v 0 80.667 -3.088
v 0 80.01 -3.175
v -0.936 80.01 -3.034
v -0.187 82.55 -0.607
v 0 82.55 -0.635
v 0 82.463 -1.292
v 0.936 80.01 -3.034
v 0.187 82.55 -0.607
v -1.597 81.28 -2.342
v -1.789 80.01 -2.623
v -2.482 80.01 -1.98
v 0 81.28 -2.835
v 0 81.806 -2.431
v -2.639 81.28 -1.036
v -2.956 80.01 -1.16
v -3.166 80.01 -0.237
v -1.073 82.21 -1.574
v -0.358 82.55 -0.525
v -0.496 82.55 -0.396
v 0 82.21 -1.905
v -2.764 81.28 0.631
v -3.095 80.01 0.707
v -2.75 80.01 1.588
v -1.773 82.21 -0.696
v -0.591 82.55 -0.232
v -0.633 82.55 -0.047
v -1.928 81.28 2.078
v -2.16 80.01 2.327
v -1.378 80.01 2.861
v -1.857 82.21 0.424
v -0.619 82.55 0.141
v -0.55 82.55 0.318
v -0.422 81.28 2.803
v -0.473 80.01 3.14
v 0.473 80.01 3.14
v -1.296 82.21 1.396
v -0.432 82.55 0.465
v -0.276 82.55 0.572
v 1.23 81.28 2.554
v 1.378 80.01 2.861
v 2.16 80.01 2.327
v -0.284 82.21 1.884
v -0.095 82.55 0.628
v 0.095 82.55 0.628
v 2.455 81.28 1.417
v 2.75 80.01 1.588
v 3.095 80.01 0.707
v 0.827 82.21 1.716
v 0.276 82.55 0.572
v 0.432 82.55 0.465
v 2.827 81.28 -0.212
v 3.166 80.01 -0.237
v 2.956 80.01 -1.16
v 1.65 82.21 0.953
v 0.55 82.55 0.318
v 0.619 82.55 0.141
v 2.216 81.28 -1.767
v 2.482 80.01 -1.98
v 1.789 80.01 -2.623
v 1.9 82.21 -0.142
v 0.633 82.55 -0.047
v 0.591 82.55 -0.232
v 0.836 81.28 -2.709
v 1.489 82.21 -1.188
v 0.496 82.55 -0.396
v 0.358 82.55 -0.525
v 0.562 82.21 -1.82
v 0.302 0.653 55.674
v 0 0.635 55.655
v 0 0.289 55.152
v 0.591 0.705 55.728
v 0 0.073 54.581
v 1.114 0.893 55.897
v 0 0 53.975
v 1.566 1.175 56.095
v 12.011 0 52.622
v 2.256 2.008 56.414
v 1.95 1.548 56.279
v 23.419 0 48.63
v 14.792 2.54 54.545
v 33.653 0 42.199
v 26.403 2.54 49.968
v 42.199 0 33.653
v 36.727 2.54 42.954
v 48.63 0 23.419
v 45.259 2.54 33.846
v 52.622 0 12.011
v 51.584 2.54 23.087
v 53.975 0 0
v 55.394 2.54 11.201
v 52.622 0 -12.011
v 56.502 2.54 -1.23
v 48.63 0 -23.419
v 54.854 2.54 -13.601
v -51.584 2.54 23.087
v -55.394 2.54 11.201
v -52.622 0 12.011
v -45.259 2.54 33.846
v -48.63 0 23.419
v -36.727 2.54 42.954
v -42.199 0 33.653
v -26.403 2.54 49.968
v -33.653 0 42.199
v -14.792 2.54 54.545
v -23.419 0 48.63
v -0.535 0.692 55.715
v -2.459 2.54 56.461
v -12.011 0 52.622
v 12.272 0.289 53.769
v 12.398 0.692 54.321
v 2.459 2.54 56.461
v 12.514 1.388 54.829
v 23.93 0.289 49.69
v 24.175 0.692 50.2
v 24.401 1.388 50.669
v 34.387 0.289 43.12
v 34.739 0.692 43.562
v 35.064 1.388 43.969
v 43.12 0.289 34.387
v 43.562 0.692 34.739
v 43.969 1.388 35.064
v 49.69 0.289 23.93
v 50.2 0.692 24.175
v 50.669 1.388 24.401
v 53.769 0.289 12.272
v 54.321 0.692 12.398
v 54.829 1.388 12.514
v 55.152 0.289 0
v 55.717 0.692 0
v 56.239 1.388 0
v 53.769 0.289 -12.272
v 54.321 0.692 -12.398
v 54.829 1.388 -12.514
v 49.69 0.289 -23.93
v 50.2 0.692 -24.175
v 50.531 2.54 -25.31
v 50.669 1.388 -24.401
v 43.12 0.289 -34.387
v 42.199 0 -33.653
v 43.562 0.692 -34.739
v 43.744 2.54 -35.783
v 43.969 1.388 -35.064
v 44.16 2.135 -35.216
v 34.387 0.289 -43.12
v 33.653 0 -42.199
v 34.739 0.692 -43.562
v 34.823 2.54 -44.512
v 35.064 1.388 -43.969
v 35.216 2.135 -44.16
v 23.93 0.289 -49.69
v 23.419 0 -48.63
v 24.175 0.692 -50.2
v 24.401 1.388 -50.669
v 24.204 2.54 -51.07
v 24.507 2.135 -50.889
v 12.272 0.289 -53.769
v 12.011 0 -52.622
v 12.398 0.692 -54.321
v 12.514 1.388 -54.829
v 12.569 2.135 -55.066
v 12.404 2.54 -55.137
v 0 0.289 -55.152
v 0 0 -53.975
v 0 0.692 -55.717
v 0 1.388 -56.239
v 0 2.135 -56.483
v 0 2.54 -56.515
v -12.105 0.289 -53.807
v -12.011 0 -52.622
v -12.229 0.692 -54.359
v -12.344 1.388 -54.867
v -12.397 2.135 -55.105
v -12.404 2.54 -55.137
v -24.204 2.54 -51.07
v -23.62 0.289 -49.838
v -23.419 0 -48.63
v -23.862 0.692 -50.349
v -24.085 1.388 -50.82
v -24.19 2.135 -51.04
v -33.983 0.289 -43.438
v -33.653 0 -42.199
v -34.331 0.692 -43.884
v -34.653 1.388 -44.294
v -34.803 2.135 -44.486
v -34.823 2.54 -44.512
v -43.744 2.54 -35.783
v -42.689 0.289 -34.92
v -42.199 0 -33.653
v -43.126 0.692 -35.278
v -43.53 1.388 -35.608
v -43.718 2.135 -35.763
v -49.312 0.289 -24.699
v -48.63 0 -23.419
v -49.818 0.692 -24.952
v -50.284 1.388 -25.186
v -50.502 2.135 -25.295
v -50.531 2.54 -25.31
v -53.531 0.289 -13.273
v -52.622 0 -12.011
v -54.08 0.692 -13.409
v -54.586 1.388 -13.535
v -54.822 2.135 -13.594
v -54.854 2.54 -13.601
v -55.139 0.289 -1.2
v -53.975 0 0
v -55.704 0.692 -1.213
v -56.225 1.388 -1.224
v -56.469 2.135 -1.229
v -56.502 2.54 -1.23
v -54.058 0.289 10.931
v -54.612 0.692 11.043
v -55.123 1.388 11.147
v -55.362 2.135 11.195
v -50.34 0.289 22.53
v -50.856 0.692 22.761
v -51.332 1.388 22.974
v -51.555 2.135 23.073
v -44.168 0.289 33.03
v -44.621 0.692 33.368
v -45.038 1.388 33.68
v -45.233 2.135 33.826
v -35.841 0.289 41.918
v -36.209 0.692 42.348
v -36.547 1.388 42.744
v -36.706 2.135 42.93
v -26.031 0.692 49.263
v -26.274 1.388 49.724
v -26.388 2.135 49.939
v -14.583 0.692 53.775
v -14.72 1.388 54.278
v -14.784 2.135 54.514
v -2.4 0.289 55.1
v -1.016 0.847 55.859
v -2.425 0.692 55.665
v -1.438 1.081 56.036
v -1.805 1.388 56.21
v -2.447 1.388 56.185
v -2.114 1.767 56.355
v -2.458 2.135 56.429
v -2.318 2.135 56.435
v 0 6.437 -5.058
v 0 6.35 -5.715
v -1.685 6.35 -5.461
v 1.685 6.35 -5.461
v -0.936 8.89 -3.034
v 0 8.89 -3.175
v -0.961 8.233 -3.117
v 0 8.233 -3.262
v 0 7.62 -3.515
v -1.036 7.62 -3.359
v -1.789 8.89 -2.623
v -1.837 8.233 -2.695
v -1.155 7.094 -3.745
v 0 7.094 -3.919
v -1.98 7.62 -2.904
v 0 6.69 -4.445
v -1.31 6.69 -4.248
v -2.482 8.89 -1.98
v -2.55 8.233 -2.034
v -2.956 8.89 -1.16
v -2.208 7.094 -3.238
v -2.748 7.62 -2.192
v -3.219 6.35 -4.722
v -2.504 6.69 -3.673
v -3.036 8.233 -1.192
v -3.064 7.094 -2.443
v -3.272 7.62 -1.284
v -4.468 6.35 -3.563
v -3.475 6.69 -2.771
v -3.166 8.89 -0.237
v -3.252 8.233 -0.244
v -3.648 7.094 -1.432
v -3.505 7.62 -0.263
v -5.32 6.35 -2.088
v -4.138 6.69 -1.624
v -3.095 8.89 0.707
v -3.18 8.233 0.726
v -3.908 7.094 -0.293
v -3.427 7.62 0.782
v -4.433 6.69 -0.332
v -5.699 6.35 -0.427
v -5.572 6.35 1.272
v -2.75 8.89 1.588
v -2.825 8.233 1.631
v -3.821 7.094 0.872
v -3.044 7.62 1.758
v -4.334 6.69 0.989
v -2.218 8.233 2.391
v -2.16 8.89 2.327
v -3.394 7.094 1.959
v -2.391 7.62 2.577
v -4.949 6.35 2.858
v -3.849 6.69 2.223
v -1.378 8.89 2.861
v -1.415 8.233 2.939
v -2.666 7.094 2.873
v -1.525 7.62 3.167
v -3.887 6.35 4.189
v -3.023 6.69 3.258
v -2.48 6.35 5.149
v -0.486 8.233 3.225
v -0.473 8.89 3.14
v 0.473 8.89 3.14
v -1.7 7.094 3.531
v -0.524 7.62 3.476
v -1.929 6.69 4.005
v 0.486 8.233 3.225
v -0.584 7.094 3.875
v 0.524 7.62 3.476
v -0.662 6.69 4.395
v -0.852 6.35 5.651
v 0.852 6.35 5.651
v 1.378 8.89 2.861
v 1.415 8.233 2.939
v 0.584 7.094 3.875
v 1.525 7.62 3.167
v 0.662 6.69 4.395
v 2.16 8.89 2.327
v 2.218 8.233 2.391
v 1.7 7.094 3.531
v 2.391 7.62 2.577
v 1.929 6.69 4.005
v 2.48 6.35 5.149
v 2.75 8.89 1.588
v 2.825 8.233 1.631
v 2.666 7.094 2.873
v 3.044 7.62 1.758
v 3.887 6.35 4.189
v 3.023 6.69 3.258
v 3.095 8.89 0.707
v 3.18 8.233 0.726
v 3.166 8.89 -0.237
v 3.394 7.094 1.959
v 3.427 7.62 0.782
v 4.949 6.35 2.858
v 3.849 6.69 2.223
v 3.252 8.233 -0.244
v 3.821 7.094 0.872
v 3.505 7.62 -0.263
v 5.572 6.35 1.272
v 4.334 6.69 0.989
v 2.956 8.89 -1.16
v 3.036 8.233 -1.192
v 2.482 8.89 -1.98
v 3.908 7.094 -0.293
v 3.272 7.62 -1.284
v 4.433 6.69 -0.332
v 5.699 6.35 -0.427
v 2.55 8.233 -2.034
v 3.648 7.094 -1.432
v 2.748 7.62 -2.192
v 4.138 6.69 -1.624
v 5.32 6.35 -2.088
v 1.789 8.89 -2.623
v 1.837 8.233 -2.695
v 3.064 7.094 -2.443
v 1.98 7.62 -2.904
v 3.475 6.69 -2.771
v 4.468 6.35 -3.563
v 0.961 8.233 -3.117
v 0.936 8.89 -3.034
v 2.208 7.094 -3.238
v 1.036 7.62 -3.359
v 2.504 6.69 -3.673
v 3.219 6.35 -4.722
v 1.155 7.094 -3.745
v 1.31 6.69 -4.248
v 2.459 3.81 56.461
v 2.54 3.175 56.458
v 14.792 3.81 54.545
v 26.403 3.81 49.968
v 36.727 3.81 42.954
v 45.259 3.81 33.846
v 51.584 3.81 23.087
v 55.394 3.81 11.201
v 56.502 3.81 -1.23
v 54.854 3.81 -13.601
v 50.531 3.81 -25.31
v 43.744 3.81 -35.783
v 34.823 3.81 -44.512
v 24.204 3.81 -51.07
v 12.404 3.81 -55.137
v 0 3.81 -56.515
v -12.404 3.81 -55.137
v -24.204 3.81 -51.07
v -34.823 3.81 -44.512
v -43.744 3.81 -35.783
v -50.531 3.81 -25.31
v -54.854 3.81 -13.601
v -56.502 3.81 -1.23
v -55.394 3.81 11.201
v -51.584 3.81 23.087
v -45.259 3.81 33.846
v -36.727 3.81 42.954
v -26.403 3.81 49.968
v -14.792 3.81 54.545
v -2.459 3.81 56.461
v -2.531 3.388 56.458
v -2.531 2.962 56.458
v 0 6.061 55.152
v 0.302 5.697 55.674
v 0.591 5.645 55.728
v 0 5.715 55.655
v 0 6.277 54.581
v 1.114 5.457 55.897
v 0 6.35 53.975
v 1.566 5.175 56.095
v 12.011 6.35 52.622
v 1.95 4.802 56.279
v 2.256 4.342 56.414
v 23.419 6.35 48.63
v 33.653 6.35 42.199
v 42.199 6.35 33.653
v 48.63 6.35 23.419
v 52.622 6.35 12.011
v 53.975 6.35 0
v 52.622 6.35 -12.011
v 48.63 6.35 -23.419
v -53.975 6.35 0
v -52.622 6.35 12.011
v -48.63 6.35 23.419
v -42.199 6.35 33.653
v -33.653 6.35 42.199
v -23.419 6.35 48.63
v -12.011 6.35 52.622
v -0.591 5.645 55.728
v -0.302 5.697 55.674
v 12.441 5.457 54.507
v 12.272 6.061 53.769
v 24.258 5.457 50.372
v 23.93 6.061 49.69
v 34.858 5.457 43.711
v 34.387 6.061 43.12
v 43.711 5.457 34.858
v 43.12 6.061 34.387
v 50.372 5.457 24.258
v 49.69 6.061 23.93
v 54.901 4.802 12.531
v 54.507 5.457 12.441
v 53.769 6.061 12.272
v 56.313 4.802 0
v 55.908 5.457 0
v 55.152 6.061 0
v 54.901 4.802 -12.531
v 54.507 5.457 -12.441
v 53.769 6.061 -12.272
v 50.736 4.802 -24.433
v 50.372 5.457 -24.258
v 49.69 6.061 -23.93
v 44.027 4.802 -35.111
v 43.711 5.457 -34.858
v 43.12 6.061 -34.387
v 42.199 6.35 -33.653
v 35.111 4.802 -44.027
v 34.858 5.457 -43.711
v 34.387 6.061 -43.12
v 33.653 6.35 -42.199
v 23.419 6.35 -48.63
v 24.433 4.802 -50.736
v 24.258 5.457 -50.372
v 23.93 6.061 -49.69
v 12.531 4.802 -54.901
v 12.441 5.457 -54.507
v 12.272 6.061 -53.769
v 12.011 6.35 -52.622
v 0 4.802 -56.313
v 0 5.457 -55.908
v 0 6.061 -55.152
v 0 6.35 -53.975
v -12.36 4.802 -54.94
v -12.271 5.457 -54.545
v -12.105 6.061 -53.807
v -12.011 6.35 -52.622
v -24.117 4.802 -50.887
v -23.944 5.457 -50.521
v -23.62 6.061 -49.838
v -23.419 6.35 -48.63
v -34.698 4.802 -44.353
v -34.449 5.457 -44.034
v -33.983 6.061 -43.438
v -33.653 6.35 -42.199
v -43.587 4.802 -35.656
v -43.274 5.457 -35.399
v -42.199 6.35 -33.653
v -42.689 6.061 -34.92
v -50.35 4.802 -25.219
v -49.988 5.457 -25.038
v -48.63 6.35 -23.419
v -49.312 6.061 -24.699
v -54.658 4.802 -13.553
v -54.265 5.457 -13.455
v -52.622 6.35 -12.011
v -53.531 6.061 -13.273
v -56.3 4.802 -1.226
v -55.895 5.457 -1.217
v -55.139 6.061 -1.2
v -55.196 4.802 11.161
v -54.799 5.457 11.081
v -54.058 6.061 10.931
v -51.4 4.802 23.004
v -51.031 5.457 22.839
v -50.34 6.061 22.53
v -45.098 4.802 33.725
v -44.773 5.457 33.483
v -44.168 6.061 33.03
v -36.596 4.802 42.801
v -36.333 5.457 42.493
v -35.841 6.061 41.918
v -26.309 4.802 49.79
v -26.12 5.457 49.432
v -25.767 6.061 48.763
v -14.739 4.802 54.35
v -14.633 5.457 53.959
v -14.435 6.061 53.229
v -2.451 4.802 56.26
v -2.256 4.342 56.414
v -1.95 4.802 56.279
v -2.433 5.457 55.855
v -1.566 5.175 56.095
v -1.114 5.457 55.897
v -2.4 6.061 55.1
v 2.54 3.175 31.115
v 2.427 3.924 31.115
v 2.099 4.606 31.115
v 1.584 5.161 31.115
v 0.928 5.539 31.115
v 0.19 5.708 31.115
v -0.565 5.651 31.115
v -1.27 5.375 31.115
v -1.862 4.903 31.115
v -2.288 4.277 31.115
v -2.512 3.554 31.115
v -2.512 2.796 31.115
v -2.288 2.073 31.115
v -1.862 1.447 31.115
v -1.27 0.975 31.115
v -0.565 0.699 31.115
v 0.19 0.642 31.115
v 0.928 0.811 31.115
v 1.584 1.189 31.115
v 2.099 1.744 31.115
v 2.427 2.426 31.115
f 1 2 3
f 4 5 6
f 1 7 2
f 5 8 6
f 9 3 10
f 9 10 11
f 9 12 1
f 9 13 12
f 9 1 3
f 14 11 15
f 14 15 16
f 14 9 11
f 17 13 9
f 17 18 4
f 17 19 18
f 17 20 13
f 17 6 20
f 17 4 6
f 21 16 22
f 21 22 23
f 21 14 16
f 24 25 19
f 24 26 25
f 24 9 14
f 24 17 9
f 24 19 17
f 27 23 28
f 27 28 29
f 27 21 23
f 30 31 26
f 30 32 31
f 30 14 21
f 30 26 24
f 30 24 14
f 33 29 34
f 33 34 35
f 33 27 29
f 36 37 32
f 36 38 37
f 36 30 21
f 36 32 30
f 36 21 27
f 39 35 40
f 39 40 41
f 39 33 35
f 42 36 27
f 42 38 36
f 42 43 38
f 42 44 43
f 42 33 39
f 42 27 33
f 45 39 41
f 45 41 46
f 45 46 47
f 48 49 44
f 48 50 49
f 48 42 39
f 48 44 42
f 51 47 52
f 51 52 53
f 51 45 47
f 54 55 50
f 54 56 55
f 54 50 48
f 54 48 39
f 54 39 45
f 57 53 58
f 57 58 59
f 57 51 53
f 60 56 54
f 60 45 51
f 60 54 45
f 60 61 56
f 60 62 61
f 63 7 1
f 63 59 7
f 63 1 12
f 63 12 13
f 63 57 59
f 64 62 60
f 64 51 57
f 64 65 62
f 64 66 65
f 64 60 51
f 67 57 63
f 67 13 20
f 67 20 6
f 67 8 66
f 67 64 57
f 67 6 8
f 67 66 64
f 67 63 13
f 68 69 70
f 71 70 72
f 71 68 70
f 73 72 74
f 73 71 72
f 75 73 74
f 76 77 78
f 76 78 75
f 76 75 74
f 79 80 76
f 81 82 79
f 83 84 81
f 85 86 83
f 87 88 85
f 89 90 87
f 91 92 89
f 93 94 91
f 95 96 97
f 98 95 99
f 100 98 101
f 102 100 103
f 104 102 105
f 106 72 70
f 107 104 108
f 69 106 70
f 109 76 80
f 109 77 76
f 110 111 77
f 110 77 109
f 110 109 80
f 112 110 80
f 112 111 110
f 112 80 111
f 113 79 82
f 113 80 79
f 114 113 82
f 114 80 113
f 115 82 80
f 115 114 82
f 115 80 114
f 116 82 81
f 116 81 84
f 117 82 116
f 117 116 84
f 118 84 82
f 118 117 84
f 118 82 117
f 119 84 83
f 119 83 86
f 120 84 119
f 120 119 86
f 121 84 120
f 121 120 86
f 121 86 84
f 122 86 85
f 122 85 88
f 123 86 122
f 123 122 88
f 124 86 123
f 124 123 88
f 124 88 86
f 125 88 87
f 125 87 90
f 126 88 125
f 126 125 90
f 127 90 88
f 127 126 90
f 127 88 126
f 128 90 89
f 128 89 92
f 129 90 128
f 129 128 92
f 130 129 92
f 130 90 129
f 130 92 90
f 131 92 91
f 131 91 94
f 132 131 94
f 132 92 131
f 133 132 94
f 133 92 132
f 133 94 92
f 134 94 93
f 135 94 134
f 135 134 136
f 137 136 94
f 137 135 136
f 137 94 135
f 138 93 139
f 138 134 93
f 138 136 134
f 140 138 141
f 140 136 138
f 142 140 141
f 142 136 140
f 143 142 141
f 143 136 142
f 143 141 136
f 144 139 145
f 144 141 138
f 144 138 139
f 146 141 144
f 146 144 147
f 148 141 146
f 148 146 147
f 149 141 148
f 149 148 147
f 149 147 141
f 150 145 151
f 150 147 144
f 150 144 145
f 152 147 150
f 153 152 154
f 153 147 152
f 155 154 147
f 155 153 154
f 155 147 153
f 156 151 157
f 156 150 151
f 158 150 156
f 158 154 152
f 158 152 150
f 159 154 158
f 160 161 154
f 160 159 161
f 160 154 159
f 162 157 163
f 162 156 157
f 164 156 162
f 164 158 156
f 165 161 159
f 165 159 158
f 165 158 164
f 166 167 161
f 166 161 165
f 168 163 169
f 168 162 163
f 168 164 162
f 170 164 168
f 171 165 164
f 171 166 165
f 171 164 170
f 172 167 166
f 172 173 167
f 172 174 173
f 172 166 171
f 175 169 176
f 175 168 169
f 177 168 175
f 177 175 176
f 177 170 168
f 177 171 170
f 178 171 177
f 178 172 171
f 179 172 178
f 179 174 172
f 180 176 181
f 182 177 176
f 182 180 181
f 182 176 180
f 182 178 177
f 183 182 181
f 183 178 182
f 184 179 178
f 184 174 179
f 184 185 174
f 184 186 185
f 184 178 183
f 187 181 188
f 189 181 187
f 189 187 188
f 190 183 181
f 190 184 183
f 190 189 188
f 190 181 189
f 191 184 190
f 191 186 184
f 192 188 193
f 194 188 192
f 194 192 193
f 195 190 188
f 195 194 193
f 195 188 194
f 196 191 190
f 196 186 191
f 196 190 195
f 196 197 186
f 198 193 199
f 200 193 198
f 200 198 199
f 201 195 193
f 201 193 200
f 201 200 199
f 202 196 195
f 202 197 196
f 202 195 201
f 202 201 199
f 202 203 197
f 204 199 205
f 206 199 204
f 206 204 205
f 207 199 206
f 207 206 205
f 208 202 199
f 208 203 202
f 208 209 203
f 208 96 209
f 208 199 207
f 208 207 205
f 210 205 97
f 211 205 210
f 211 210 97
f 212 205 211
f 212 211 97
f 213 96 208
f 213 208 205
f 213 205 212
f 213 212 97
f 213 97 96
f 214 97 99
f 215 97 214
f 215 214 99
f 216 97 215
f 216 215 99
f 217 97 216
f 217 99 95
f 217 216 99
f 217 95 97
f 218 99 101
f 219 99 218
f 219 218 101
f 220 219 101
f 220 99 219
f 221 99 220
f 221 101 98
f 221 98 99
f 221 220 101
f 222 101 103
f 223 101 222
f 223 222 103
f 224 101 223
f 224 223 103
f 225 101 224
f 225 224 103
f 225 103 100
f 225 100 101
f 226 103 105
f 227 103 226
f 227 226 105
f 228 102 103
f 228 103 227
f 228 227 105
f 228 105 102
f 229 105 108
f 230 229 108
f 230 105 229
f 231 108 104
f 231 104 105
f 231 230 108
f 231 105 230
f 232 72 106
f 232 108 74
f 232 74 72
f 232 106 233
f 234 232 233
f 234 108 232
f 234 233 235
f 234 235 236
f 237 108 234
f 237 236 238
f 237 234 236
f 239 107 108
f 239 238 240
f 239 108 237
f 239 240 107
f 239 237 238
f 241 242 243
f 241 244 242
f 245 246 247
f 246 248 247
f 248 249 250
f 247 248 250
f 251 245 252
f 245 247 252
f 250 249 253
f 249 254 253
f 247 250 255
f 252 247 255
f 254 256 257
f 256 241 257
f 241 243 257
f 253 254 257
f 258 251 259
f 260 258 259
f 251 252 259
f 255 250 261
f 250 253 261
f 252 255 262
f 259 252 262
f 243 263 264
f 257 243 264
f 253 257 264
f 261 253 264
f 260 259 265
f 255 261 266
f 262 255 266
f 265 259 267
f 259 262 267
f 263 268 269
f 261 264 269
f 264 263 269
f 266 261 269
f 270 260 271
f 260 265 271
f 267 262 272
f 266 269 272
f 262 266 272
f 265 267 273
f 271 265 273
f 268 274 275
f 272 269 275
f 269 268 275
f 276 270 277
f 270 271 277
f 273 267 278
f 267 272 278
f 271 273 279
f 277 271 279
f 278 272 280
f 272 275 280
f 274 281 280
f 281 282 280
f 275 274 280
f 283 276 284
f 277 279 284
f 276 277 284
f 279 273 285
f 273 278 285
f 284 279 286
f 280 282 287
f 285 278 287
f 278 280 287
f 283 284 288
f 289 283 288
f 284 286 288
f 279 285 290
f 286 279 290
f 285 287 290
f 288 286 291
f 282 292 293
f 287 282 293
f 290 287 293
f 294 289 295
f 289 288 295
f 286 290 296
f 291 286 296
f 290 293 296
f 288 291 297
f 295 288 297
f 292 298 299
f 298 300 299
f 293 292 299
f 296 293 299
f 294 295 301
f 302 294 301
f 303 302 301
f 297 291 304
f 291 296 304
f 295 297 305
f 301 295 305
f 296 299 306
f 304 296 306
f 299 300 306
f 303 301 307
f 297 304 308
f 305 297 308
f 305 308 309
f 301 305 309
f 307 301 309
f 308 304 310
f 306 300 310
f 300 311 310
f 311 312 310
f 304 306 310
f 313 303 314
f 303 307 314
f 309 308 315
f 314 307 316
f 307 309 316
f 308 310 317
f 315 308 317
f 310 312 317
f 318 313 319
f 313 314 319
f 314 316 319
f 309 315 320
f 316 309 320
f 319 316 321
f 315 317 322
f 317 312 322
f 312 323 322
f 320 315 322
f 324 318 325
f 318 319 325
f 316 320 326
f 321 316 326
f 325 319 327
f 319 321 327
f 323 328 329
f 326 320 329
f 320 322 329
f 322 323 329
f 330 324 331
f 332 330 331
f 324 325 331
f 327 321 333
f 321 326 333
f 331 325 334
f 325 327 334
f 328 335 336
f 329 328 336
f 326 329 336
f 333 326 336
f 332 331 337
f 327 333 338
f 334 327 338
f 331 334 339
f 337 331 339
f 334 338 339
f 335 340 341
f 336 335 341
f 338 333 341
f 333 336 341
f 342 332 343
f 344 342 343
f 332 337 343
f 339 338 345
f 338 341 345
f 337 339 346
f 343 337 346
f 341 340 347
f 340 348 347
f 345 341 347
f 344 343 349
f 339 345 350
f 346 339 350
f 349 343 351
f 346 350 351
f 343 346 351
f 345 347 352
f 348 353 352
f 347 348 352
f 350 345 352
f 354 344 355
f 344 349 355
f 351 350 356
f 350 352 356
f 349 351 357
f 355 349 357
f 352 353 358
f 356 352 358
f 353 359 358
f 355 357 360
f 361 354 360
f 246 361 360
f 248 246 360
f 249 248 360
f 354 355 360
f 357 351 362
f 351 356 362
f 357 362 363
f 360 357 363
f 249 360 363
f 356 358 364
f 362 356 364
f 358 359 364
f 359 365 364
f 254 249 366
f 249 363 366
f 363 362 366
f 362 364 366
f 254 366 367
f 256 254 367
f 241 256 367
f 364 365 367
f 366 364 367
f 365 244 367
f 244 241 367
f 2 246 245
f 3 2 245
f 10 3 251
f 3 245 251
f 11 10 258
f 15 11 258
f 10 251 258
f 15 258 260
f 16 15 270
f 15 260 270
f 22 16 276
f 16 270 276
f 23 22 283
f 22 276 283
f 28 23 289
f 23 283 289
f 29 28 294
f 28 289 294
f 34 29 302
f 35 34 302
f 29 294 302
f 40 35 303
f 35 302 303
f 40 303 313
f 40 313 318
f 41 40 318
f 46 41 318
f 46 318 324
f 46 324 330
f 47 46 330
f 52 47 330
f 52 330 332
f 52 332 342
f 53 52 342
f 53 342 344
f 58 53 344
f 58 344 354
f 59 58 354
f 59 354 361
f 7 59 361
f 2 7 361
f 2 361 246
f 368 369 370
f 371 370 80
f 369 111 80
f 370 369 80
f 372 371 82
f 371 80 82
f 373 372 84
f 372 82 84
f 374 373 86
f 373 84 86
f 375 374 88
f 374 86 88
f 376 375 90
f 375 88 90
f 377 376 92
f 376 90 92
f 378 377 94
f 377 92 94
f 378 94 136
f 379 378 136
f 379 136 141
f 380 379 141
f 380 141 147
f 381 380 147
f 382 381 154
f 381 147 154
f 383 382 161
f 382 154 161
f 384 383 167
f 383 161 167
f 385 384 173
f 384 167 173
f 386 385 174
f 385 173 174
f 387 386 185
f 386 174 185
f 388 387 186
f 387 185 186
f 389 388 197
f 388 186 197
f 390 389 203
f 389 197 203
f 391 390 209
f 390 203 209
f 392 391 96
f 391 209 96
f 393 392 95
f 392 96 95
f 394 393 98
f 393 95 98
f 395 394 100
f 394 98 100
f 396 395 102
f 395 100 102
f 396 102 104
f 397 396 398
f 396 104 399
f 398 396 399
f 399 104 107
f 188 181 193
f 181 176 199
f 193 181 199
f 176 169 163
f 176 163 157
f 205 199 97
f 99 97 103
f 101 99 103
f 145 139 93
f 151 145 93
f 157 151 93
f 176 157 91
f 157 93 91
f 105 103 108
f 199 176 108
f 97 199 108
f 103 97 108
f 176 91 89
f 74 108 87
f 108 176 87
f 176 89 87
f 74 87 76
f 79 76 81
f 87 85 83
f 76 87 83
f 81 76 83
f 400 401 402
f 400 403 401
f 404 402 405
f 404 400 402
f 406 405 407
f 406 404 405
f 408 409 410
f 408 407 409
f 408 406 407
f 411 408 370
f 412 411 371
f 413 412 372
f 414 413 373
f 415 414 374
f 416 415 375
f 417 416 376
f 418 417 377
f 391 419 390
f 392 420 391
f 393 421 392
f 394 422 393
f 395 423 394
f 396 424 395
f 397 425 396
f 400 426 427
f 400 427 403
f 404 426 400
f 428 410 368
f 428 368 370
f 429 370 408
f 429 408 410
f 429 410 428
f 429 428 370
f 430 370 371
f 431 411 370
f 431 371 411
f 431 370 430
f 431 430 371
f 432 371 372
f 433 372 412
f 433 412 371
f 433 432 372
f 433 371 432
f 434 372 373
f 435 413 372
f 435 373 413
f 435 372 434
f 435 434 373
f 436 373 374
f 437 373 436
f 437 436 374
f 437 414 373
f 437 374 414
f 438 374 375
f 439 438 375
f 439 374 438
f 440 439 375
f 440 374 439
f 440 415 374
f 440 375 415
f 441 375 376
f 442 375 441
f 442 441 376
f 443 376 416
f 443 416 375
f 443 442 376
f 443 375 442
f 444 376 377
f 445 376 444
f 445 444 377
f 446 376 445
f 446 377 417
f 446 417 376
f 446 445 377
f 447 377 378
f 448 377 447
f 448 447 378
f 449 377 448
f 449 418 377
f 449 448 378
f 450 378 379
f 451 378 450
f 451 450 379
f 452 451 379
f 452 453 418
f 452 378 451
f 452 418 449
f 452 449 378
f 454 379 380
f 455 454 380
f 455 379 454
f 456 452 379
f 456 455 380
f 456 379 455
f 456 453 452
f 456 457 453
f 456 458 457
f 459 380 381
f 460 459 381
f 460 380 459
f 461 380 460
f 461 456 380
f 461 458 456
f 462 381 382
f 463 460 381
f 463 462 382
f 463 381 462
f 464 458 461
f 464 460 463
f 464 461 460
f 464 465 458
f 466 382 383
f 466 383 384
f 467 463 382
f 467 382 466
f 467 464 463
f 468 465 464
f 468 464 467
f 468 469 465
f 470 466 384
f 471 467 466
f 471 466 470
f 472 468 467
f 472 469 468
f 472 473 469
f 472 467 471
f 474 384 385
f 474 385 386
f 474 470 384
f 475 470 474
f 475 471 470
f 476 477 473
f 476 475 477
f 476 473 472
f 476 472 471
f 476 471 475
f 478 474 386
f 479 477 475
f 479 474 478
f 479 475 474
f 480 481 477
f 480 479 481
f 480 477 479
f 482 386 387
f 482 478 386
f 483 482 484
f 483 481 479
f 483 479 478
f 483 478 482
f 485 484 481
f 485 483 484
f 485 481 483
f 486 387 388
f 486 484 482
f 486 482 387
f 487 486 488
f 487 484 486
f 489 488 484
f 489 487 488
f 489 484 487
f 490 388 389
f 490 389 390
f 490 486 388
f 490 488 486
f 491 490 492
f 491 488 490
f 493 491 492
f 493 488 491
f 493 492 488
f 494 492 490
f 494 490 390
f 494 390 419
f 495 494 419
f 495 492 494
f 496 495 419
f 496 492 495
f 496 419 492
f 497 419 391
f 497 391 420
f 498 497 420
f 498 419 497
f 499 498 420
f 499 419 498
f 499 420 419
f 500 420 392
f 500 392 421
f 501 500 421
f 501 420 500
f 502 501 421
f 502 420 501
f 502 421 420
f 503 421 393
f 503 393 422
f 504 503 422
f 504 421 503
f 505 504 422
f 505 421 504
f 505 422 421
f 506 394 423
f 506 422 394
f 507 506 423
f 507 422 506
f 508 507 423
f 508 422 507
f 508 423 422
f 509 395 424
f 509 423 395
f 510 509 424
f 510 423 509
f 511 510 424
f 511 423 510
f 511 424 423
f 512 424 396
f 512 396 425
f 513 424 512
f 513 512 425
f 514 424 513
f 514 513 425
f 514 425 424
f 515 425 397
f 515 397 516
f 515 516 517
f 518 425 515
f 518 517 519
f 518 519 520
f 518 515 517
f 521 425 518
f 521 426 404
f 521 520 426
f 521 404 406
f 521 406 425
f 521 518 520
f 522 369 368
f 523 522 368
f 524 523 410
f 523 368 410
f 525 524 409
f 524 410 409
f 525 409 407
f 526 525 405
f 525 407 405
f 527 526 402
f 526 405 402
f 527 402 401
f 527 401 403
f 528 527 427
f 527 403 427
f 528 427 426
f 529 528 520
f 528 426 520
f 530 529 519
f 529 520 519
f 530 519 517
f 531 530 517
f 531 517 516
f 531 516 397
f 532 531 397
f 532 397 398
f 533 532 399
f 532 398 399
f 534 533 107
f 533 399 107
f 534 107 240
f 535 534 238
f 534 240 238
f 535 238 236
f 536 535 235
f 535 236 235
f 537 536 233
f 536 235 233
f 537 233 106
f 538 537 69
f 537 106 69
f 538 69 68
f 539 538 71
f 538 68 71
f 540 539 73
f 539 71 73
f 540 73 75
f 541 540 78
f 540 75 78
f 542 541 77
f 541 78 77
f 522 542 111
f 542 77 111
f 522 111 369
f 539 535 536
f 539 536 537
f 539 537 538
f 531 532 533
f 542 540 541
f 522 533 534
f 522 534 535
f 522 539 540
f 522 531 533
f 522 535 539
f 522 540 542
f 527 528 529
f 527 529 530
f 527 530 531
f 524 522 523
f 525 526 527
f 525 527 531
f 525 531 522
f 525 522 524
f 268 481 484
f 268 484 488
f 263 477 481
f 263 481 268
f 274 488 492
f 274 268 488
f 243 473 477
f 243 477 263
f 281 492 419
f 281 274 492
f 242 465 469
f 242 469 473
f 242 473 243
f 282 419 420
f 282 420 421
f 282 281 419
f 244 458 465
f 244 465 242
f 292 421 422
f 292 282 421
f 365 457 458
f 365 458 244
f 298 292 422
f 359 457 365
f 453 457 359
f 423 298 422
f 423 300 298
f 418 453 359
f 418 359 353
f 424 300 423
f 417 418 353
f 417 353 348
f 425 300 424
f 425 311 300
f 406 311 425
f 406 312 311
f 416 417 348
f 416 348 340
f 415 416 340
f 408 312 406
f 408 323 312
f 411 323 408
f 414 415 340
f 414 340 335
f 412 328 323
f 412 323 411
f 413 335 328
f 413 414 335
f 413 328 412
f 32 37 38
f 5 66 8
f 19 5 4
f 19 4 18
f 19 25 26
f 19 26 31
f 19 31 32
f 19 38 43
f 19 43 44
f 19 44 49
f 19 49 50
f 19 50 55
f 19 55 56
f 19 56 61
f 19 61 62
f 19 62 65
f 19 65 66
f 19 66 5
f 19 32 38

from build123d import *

# Parameters (mm, degrees)
SKETCH1_R           = 56.515
BOSS_EXTRUDE1_DEPTH = 6.35
SKETCH2_R           = 3.175
BOSS_EXTRUDE2_DEPTH = 76.2
SKETCH5_R           = 2.54
CUT_EXTRUDE1_DEPTH  = 25.4
FILLET2_R           = 2.54


with BuildPart() as part:
    # Sketch1 → Boss-Extrude1 (new body)
    with BuildSketch(Plane(origin=(0, 0, 0), x_dir=(1, 0, 0), z_dir=(0, 1, 0))):
        with Locations(Location((0, 0, 0), (0, 0, 270))):
            Circle(SKETCH1_R)
    extrude(amount=BOSS_EXTRUDE1_DEPTH)

    # Sketch2 → Boss-Extrude2 (add)
    with BuildSketch(Plane(origin=(0, 6.35, 0), x_dir=(1, 0, 0), z_dir=(0, 1, 0))):
        with Locations(Location((0, 0, 0), (0, 0, 90))):
            Circle(SKETCH2_R)
    extrude(amount=BOSS_EXTRUDE2_DEPTH)

    # Sketch5 → Cut-Extrude1 (cut)
    with BuildSketch(Plane.XY.offset(56.515)):
        with Locations((0, 3.175)):
            Circle(SKETCH5_R)
    extrude(amount=-CUT_EXTRUDE1_DEPTH, mode=Mode.SUBTRACT)

    # Fillet2
    # the kernel refuses this fillet: 2.54 mm, written as the material it adds along each edge
    with BuildSketch(Plane(origin=(0, 6.35, 0), x_dir=(0, 0, -1), z_dir=(1, 0, 0))) as fillet2_piece_1:
        with BuildLine():
            CenterArc((3.175 + FILLET2_R, FILLET2_R), FILLET2_R, 180, 90)
            Line((3.175, FILLET2_R), (3.175, 0))
            Line((3.175, 0), (3.175 + FILLET2_R, 0))
        make_face()
    revolve(axis=Axis((0, 6.35, 0), (0, 1, 0)))
    # the kernel refuses this fillet: 2.54 mm, written as the material it takes off along each edge
    with BuildSketch(Plane(origin=(0, 82.55, 0), x_dir=(0, 0, -1), z_dir=(1, 0, 0))) as fillet2_2_piece_1:
        with BuildLine():
            CenterArc((3.175 - FILLET2_R, -FILLET2_R), FILLET2_R, 0, 90)
            Line((3.175 - FILLET2_R, 0), (3.175, 0))
            Line((3.175, 0), (3.175, -FILLET2_R))
        make_face()
    revolve(axis=Axis((0, 82.55, 0), (0, 1, 0)), mode=Mode.SUBTRACT)
    with BuildSketch(Plane(origin=(0, 0, 0), x_dir=(0, 0, 1), z_dir=(-1, 0, 0))) as fillet2_2_piece_2:
        with BuildLine():
            CenterArc((56.515 - FILLET2_R, FILLET2_R), FILLET2_R, 270, 90)
            Line((56.515 - FILLET2_R, 0), (56.515, 0))
            Line((56.515, 0), (56.515, FILLET2_R))
        make_face()
    revolve(axis=Axis((0, 0, 0), (0, 1, 0)), mode=Mode.SUBTRACT)
    with BuildSketch(Plane(origin=(0, 6.35, 0), x_dir=(0, 0, 1), z_dir=(-1, 0, 0))) as fillet2_2_piece_3:
        with BuildLine():
            CenterArc((56.515 - FILLET2_R, -FILLET2_R), FILLET2_R, 0, 90)
            Line((56.515 - FILLET2_R, 0), (56.515, 0))
            Line((56.515, 0), (56.515, -FILLET2_R))
        make_face()
    revolve(axis=Axis((0, 6.35, 0), (0, 1, 0)), mode=Mode.SUBTRACT)


solid = part.part
